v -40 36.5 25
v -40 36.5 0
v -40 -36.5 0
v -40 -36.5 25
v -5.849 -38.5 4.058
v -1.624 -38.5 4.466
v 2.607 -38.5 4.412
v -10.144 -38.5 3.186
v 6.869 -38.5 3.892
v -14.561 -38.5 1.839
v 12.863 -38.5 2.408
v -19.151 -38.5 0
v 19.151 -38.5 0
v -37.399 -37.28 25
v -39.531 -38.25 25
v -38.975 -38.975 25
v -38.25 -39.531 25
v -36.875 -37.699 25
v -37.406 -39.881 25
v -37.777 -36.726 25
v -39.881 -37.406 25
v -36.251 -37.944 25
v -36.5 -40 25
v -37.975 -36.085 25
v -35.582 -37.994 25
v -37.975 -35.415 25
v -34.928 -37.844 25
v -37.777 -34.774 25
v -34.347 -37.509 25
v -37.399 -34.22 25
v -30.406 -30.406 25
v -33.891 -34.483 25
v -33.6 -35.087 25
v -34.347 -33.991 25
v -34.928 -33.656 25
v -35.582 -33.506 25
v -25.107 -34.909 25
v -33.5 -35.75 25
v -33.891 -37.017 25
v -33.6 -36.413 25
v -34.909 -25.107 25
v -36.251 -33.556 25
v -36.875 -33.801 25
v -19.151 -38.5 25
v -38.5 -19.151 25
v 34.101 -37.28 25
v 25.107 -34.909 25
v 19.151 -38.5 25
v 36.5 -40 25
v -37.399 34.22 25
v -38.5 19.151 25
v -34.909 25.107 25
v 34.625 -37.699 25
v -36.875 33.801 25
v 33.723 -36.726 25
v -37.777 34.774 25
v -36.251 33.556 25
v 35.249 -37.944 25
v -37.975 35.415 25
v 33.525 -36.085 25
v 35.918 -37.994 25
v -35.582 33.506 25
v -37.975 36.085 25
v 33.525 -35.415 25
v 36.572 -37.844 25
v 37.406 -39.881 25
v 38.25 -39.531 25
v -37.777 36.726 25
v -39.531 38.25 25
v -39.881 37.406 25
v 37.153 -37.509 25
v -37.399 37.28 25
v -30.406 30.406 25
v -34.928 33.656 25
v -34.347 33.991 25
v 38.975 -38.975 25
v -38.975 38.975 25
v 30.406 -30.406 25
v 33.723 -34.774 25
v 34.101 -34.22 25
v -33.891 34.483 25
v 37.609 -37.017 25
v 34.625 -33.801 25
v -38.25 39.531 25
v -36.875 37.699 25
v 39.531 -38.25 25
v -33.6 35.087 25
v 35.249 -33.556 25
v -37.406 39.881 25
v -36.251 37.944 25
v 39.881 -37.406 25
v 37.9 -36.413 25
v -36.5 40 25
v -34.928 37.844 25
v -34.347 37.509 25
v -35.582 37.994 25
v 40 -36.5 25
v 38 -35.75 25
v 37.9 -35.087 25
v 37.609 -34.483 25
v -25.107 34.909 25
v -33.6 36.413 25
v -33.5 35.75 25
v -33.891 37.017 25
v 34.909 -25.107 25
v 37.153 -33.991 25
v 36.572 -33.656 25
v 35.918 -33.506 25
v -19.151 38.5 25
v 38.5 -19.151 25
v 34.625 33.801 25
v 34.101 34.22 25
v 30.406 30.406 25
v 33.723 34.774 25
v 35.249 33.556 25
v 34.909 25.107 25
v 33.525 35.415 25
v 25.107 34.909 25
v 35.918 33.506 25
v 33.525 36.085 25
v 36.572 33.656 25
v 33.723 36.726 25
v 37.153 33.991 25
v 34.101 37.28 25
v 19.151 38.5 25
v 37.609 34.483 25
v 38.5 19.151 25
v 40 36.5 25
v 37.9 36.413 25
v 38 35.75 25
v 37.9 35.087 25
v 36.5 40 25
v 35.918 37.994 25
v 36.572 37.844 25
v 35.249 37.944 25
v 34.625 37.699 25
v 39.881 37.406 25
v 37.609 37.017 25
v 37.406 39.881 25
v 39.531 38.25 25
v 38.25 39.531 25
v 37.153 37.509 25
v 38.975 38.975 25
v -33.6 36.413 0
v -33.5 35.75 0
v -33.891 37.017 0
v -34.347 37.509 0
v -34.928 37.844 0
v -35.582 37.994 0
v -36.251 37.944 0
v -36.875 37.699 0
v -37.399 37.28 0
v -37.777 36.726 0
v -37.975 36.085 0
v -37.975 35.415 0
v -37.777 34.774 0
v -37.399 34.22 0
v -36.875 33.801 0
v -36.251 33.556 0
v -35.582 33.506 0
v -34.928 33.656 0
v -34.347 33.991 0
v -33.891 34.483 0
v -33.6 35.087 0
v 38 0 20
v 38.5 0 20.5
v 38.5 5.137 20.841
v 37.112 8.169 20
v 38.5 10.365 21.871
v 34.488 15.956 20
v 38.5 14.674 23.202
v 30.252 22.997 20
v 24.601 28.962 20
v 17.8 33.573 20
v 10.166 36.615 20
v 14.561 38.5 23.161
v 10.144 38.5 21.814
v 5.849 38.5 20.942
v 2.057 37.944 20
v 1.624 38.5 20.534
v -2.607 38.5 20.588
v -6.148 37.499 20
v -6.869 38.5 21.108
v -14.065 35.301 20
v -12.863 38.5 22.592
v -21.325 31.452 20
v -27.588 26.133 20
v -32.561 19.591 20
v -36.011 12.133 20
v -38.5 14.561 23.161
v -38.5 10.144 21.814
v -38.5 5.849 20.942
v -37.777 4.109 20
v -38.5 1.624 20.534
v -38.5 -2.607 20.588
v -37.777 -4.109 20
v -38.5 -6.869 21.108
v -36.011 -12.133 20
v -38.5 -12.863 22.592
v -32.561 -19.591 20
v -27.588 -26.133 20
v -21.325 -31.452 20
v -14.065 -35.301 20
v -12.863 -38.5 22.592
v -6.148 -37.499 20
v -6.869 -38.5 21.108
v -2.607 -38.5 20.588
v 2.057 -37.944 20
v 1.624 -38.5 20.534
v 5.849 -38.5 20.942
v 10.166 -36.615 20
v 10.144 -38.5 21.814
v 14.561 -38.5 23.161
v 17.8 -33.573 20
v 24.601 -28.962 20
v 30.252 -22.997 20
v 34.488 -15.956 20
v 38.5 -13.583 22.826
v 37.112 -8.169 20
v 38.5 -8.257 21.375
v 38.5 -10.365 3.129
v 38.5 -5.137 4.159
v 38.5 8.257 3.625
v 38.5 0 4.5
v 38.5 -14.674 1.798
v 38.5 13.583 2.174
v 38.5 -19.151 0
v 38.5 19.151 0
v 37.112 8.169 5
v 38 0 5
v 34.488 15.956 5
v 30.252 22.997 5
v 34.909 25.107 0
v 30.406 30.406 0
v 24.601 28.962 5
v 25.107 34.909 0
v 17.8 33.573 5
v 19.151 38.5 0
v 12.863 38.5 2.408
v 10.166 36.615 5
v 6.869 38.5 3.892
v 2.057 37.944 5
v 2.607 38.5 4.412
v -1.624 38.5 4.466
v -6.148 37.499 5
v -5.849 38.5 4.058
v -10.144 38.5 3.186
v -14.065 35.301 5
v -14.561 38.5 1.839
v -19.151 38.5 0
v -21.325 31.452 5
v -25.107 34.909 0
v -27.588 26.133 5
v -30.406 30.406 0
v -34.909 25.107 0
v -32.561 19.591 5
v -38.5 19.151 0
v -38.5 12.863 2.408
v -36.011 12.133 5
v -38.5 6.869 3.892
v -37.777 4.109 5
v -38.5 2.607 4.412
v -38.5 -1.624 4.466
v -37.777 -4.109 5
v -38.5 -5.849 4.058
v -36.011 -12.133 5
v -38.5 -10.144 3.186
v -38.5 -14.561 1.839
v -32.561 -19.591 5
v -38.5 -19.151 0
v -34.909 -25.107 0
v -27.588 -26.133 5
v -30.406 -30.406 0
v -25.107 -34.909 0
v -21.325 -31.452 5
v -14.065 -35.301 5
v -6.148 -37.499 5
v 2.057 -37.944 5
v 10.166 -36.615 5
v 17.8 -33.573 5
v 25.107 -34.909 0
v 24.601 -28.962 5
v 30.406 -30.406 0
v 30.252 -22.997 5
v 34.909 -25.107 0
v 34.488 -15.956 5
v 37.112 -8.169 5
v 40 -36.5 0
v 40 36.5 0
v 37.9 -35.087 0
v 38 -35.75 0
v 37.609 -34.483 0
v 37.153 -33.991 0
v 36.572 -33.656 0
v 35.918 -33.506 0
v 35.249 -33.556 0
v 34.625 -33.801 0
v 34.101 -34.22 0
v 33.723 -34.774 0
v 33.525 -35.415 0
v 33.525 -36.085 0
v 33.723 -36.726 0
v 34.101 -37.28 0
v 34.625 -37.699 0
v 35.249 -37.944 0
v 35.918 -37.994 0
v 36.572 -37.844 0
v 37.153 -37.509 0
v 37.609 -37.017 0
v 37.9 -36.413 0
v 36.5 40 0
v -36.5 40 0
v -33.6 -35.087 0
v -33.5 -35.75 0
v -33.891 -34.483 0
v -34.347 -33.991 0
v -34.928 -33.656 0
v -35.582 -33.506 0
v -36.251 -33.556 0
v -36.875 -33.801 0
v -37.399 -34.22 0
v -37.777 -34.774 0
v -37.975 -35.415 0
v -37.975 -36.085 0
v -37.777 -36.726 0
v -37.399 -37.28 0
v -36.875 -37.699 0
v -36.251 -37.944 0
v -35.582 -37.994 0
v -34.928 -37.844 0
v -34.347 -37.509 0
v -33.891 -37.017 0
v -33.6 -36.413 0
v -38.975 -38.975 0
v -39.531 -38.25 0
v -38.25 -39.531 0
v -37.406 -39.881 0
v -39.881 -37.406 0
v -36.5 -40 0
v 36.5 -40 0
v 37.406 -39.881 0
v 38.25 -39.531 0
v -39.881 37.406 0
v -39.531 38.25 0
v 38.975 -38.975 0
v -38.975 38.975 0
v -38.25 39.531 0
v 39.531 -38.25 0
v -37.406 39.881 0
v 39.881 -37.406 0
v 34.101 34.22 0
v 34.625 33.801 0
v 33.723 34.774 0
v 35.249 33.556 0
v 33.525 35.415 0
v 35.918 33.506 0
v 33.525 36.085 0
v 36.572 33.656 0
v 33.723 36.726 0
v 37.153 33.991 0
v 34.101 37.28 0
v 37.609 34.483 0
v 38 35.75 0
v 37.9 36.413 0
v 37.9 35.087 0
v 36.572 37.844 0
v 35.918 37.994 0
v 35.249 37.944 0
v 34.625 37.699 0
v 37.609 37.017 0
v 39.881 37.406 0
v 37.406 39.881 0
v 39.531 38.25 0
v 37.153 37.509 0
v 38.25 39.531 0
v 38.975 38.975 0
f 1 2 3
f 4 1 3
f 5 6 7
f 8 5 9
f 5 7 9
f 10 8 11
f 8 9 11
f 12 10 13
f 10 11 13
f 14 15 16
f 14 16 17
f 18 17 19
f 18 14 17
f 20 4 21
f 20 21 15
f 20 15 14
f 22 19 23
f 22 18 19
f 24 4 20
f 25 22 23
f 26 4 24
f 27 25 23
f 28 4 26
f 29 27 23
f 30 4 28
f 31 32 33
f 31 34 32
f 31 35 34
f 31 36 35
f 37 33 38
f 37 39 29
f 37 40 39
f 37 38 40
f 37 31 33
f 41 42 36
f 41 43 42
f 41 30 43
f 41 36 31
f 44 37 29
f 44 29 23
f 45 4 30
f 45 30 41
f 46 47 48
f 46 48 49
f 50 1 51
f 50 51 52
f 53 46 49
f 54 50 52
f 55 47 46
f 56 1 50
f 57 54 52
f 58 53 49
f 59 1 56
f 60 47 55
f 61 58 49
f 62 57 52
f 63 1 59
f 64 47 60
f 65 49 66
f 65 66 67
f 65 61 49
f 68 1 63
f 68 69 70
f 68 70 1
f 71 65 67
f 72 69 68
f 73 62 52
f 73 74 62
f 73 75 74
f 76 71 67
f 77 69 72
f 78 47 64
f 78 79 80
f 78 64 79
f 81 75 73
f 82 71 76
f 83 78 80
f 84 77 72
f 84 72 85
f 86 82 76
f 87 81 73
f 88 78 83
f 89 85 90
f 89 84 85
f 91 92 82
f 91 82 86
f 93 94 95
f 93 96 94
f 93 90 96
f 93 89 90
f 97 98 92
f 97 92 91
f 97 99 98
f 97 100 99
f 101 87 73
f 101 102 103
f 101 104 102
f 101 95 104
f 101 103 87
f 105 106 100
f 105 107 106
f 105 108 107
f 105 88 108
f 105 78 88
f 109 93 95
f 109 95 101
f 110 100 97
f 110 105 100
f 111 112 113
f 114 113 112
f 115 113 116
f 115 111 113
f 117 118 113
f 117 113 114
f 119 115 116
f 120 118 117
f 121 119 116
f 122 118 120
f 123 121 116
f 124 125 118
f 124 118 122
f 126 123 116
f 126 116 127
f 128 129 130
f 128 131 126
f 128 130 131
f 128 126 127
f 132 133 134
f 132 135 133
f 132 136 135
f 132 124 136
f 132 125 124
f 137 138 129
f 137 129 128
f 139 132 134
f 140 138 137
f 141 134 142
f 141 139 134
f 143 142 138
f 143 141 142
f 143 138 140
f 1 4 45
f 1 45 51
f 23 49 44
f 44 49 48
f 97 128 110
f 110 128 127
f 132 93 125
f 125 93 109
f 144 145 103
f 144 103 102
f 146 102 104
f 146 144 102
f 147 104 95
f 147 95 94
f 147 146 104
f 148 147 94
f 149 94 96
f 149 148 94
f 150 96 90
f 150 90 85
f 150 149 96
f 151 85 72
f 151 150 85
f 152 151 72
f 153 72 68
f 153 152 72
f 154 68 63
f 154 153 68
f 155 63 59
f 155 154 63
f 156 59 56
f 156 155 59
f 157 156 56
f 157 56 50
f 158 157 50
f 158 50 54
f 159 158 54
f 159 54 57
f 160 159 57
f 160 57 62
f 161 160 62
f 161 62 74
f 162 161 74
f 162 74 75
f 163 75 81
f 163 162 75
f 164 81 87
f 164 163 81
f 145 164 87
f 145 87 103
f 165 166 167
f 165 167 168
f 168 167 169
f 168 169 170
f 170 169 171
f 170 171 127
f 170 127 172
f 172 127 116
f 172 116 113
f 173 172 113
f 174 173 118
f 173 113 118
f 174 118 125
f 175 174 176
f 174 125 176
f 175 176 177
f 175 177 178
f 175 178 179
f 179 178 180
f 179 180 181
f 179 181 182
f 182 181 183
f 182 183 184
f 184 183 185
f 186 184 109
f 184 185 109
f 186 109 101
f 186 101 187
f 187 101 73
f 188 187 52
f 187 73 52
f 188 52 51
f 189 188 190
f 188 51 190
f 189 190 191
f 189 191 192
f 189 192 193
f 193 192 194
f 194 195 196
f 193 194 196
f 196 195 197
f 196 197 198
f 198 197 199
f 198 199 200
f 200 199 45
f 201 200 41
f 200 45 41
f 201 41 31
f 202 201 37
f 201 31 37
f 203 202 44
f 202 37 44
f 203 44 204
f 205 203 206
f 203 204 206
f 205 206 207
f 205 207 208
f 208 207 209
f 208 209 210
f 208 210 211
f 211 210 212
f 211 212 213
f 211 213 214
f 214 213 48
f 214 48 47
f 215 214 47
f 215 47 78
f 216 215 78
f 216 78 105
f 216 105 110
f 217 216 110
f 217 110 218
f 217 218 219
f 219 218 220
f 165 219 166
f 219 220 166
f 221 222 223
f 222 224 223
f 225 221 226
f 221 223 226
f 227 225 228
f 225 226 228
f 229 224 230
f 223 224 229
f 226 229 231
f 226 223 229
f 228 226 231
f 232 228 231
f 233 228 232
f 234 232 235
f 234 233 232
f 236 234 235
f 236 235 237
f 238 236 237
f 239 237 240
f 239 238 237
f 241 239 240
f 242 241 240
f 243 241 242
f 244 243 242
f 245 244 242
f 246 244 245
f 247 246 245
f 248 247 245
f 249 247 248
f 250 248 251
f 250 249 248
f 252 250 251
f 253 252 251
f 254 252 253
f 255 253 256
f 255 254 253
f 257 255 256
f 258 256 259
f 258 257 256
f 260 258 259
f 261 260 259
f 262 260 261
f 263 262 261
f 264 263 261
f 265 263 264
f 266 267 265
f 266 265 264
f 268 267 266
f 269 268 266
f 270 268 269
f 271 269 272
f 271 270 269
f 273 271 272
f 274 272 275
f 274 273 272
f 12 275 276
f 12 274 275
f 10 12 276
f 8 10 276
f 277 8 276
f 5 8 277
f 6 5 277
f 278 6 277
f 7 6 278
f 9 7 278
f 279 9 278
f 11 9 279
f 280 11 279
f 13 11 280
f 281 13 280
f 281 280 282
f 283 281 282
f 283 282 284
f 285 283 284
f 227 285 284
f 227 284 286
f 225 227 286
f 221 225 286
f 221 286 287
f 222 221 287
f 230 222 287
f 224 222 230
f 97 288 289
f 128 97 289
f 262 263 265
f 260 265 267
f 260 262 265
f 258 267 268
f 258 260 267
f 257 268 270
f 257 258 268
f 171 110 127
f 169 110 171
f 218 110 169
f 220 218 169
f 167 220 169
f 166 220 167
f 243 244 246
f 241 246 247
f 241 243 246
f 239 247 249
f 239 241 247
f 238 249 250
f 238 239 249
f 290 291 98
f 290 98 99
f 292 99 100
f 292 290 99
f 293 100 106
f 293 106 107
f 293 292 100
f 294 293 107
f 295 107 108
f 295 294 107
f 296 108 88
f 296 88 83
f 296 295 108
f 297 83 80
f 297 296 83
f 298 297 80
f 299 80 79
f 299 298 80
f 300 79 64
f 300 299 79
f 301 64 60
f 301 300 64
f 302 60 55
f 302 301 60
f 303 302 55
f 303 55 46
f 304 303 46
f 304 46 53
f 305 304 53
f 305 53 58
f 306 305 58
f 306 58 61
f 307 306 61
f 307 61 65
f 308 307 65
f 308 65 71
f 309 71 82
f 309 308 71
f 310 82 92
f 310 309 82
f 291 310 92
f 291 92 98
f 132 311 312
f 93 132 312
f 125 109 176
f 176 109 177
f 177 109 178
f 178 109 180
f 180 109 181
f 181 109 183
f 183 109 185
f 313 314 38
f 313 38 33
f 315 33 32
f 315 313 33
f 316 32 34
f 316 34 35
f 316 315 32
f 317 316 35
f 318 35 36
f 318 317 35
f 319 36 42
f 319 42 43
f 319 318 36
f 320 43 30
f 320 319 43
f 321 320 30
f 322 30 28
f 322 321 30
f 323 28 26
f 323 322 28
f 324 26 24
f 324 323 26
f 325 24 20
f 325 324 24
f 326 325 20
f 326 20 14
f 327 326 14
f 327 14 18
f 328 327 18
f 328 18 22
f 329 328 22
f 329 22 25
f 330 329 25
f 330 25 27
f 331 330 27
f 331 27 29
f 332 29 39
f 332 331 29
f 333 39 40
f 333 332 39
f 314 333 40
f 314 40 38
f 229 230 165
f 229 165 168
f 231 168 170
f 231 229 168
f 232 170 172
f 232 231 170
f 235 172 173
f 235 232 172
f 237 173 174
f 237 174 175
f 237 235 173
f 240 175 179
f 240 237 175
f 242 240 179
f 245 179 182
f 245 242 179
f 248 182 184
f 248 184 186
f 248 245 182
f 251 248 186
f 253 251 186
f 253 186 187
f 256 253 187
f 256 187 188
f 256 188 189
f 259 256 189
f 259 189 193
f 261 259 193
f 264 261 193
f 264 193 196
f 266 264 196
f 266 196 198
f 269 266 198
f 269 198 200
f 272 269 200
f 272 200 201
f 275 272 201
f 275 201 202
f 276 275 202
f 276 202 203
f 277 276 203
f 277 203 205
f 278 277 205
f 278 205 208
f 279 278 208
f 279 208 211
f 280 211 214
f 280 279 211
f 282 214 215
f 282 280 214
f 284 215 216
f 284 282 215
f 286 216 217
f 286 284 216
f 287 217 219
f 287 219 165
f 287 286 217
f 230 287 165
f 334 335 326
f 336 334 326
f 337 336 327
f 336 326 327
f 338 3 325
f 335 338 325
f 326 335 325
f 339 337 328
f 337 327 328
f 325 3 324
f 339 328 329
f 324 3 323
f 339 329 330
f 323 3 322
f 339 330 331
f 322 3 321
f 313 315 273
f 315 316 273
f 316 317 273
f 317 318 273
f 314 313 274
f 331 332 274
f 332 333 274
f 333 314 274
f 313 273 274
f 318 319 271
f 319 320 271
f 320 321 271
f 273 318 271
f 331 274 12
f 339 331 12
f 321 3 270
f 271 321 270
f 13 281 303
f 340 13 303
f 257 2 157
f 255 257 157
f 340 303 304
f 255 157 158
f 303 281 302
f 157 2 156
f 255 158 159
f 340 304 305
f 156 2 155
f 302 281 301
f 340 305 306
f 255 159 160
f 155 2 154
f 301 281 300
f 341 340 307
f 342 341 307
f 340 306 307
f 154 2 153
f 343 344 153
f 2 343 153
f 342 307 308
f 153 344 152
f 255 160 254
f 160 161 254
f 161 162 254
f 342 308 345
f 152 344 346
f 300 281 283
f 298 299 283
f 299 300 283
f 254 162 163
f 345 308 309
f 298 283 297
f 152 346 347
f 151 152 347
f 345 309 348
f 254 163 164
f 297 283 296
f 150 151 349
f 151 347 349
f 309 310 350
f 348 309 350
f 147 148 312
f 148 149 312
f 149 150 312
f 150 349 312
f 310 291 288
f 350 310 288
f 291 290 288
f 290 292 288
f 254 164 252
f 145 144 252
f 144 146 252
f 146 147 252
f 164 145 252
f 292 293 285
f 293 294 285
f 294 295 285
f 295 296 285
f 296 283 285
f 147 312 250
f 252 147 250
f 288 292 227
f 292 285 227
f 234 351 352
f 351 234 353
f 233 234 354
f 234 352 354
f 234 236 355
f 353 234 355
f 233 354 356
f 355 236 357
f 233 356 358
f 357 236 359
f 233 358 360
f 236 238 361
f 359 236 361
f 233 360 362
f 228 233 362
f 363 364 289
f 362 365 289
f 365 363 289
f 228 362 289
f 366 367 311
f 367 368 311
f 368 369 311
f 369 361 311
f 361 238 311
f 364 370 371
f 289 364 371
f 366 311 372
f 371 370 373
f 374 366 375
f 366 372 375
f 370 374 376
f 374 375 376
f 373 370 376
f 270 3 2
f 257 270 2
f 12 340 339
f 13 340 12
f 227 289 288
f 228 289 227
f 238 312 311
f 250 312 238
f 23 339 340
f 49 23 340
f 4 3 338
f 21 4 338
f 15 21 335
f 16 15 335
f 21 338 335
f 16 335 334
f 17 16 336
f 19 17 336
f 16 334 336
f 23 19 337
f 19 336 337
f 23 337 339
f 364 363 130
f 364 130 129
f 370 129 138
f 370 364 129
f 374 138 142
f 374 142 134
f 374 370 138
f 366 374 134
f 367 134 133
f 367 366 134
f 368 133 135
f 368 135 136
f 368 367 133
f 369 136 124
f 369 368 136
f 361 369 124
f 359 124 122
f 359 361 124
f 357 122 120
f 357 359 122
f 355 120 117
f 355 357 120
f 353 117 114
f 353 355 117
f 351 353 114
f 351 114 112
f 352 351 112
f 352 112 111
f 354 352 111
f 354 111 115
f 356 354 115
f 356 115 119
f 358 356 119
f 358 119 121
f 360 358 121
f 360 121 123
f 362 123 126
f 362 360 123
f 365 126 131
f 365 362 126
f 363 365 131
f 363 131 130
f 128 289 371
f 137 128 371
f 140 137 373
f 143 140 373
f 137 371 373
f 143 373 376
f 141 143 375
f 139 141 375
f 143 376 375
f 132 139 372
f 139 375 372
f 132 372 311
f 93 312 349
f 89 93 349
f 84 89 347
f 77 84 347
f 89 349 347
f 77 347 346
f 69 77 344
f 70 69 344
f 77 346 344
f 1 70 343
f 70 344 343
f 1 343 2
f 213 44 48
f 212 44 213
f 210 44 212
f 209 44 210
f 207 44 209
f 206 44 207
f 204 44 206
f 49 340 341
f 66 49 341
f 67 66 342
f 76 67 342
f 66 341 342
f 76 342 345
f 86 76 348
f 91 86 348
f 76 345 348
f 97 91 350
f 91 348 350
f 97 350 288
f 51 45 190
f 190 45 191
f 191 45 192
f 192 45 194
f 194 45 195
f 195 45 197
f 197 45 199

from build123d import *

# Parameters (mm, degrees)
F0_R     = 2.25
F0_R_2   = 38
F1_DEPTH = 25
F3_W     = 1.5
F3_H     = 38.3014360044
F3_W_2   = 38.3014360044
F3_H_2   = 1.5
F4_DEPTH = 25


# Not quite as in the source:
# - a fillet or chamfer that OpenCascade refuses, or shapes differently, is made with other operations: its cross-section is extruded or revolved along the edge and cut away or added


with BuildPart() as f1:
    # F0 (on Top) → F1 (new body)
    with BuildSketch(Plane.XY):
        with BuildLine():
            Line((-36.5, -40), (36.5, -40))
            ThreePointArc((36.5, -40), (38.9748737342, -38.9748737342), (40, -36.5))
            Line((40, -36.5), (40, 36.5))
            ThreePointArc((40, 36.5), (38.9748737342, 38.9748737342), (36.5, 40))
            Line((36.5, 40), (-36.5, 40))
            ThreePointArc((-36.5, 40), (-38.9748737342, 38.9748737342), (-40, 36.5))
            Line((-40, 36.5), (-40, -36.5))
            ThreePointArc((-40, -36.5), (-38.9748737342, -38.9748737342), (-36.5, -40))
        make_face()
        with Locations((-35.75, -35.75)):
            Circle(F0_R, mode=Mode.SUBTRACT)
        with Locations((35.75, -35.75)):
            Circle(F0_R, mode=Mode.SUBTRACT)
        with Locations((-35.75, 35.75)):
            Circle(F0_R, mode=Mode.SUBTRACT)
        Circle(F0_R_2, mode=Mode.SUBTRACT)
        with Locations((35.75, 35.75)):
            Circle(F0_R, mode=Mode.SUBTRACT)
    extrude(amount=F1_DEPTH)

    # F2: chamfer of 5 on 2 edges, made by hand

    # F2_s1 → F2_t2 (revolve, cut)
    with BuildSketch(Plane.XZ):
        Polygon((38, 20), (43, 25), (38, 25), align=None)
    revolve(axis=Axis((0, 0, 25), (0, 0, 1)), mode=Mode.SUBTRACT)

    # F2_s3 → F2_t4 (revolve, cut)
    with BuildSketch(Plane.XZ):
        Polygon((38, 5), (43, 0), (38, 0), align=None)
    revolve(axis=Axis((0, 0, 0), (0, 0, 1)), mode=Mode.SUBTRACT)

    # F3 (on face) → F4 (join, through all)
    with BuildSketch(Plane.XY.offset(25)):
        with Locations((-39.25, 0)):
            Rectangle(F3_W, F3_H)
        with Locations((0, -39.25)):
            Rectangle(F3_W_2, F3_H_2)
        with Locations((39.25, 0)):
            Rectangle(F3_W, F3_H)
        with Locations((0, 39.25)):
            Rectangle(F3_W_2, F3_H_2)
    extrude(amount=-F4_DEPTH)


solid = f1.part
